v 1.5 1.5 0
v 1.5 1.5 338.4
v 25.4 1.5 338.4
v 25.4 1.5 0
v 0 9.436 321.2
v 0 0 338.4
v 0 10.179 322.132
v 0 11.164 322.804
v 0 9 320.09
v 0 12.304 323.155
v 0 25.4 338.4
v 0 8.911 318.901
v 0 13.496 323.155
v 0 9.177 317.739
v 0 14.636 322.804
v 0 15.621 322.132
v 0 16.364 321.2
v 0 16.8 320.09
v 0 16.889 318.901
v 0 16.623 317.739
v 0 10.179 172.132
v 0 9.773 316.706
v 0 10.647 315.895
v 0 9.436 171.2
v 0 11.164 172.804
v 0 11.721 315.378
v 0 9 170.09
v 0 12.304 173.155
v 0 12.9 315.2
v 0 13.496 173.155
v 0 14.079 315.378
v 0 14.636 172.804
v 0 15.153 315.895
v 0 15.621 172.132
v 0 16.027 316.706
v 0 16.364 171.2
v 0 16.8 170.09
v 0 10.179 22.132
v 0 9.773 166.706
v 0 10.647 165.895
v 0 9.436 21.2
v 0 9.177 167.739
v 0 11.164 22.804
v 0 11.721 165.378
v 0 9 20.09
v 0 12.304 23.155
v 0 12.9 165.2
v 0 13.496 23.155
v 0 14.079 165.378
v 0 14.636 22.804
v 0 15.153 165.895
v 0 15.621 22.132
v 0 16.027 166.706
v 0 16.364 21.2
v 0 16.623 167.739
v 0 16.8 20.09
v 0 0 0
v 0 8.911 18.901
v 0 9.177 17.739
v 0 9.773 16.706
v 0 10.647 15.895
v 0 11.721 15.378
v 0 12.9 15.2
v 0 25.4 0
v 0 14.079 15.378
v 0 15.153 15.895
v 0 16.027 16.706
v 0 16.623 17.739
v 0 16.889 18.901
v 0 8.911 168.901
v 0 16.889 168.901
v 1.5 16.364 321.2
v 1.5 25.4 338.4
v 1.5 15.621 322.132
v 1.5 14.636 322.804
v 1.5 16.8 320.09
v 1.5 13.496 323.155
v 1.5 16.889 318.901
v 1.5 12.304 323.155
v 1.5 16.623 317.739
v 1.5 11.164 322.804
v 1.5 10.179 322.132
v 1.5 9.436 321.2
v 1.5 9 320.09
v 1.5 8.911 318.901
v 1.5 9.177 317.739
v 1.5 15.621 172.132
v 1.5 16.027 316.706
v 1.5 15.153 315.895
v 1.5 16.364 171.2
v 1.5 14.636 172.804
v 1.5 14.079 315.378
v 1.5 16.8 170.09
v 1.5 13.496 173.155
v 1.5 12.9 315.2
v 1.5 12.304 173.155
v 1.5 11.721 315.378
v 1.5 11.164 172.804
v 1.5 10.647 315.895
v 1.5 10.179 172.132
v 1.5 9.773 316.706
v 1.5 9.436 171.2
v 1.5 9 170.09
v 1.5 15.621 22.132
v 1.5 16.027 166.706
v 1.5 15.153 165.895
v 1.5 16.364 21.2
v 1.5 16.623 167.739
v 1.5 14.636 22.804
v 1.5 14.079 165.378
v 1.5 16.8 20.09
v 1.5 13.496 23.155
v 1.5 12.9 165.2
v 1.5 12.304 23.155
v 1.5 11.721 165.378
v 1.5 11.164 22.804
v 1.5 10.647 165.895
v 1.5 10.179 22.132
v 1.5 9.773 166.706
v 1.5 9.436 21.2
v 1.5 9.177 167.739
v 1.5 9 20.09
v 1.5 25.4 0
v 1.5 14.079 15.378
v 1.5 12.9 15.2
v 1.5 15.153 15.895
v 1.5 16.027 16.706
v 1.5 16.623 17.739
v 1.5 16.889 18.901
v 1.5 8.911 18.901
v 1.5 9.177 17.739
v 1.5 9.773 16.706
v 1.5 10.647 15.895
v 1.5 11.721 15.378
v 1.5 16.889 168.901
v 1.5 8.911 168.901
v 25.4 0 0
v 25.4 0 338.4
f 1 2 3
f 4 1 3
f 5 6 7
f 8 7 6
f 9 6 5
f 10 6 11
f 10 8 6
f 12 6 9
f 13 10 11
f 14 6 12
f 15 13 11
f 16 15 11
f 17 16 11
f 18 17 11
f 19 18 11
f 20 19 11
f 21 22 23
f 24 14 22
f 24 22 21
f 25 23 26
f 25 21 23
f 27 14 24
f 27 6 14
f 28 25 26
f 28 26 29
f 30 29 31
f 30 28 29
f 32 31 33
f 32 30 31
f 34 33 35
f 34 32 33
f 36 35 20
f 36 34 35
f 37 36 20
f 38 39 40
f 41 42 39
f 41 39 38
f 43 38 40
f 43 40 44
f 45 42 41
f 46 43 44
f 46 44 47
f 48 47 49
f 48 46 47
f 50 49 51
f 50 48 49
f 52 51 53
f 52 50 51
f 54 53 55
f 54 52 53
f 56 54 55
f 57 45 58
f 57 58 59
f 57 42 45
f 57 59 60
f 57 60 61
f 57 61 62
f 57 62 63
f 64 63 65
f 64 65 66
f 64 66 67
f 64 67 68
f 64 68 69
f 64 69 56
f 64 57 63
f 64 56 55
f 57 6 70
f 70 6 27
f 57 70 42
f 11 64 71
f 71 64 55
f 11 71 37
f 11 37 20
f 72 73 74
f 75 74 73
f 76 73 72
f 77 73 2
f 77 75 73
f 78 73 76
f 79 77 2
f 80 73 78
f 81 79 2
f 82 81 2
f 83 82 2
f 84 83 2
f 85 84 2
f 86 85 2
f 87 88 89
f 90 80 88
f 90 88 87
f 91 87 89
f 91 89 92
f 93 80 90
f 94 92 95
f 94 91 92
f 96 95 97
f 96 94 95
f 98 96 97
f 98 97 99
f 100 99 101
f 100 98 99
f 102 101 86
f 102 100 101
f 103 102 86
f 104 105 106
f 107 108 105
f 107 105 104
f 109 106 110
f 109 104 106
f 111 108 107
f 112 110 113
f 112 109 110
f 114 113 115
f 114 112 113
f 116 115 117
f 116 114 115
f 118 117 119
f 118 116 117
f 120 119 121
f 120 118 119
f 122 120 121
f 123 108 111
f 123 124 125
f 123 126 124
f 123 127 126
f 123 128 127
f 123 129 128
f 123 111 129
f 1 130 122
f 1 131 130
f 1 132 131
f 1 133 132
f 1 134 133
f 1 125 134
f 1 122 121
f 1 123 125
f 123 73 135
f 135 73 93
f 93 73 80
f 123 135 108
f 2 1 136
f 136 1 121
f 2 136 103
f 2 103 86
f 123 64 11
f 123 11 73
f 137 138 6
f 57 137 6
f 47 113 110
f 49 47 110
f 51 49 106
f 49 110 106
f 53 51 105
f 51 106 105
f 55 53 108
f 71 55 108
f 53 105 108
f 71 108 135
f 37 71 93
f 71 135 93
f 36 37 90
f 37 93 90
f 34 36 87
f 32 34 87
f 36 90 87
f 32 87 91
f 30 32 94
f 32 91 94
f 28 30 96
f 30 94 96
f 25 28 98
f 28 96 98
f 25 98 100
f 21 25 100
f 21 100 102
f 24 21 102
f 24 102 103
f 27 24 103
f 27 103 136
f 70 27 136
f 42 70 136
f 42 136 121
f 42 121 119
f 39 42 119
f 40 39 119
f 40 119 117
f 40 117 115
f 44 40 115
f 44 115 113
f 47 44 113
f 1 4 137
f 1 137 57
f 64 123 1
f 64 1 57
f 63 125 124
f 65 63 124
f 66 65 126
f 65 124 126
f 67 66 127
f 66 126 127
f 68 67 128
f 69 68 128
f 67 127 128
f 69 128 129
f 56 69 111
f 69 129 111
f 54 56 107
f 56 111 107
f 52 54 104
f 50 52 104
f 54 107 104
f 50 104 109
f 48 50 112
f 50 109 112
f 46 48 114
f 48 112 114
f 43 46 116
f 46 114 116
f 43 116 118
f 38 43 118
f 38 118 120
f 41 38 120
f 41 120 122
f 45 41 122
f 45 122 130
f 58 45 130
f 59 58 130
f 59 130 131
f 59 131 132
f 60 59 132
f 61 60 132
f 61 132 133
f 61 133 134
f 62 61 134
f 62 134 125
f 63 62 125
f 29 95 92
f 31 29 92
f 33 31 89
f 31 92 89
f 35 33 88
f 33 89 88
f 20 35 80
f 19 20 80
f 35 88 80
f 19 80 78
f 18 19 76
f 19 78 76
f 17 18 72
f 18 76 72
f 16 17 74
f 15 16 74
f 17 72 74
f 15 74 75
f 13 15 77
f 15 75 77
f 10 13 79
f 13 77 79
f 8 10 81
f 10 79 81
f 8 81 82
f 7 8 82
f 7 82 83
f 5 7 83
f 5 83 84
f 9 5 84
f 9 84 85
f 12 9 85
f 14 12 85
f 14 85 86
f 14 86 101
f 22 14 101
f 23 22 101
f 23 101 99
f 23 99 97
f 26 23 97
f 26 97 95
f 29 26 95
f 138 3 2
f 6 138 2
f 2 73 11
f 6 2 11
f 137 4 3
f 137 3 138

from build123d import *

# Parameters (mm, degrees)
SALIENTE_EXTRUIR1_DEPTH = 338.4
CROQUIS2_R              = 4
CORTAR_EXTRUIR1_DEPTH   = 2


with BuildPart() as part:
    # Croquis1 → Saliente-Extruir1 (new body)
    with BuildSketch(Plane.XY):
        Polygon((0, 0), (0, 25.4), (1.5, 25.4), (1.5, 1.5), (25.4, 1.5), (25.4, 0), align=None)
    extrude(amount=SALIENTE_EXTRUIR1_DEPTH)

    # Croquis2 → Cortar-Extruir1 (cut)
    with BuildSketch(Plane(origin=(1.5, 0, 0), x_dir=(0, 0, -1), z_dir=(1, 0, 0))):
        with Locations((-19.2, 12.9)):
            Circle(CROQUIS2_R)
        with Locations((-319.2, 12.9)):
            Circle(CROQUIS2_R)
        with Locations((-169.2, 12.9)):
            Circle(CROQUIS2_R)
    extrude(amount=-CORTAR_EXTRUIR1_DEPTH, mode=Mode.SUBTRACT)


solid = part.part
